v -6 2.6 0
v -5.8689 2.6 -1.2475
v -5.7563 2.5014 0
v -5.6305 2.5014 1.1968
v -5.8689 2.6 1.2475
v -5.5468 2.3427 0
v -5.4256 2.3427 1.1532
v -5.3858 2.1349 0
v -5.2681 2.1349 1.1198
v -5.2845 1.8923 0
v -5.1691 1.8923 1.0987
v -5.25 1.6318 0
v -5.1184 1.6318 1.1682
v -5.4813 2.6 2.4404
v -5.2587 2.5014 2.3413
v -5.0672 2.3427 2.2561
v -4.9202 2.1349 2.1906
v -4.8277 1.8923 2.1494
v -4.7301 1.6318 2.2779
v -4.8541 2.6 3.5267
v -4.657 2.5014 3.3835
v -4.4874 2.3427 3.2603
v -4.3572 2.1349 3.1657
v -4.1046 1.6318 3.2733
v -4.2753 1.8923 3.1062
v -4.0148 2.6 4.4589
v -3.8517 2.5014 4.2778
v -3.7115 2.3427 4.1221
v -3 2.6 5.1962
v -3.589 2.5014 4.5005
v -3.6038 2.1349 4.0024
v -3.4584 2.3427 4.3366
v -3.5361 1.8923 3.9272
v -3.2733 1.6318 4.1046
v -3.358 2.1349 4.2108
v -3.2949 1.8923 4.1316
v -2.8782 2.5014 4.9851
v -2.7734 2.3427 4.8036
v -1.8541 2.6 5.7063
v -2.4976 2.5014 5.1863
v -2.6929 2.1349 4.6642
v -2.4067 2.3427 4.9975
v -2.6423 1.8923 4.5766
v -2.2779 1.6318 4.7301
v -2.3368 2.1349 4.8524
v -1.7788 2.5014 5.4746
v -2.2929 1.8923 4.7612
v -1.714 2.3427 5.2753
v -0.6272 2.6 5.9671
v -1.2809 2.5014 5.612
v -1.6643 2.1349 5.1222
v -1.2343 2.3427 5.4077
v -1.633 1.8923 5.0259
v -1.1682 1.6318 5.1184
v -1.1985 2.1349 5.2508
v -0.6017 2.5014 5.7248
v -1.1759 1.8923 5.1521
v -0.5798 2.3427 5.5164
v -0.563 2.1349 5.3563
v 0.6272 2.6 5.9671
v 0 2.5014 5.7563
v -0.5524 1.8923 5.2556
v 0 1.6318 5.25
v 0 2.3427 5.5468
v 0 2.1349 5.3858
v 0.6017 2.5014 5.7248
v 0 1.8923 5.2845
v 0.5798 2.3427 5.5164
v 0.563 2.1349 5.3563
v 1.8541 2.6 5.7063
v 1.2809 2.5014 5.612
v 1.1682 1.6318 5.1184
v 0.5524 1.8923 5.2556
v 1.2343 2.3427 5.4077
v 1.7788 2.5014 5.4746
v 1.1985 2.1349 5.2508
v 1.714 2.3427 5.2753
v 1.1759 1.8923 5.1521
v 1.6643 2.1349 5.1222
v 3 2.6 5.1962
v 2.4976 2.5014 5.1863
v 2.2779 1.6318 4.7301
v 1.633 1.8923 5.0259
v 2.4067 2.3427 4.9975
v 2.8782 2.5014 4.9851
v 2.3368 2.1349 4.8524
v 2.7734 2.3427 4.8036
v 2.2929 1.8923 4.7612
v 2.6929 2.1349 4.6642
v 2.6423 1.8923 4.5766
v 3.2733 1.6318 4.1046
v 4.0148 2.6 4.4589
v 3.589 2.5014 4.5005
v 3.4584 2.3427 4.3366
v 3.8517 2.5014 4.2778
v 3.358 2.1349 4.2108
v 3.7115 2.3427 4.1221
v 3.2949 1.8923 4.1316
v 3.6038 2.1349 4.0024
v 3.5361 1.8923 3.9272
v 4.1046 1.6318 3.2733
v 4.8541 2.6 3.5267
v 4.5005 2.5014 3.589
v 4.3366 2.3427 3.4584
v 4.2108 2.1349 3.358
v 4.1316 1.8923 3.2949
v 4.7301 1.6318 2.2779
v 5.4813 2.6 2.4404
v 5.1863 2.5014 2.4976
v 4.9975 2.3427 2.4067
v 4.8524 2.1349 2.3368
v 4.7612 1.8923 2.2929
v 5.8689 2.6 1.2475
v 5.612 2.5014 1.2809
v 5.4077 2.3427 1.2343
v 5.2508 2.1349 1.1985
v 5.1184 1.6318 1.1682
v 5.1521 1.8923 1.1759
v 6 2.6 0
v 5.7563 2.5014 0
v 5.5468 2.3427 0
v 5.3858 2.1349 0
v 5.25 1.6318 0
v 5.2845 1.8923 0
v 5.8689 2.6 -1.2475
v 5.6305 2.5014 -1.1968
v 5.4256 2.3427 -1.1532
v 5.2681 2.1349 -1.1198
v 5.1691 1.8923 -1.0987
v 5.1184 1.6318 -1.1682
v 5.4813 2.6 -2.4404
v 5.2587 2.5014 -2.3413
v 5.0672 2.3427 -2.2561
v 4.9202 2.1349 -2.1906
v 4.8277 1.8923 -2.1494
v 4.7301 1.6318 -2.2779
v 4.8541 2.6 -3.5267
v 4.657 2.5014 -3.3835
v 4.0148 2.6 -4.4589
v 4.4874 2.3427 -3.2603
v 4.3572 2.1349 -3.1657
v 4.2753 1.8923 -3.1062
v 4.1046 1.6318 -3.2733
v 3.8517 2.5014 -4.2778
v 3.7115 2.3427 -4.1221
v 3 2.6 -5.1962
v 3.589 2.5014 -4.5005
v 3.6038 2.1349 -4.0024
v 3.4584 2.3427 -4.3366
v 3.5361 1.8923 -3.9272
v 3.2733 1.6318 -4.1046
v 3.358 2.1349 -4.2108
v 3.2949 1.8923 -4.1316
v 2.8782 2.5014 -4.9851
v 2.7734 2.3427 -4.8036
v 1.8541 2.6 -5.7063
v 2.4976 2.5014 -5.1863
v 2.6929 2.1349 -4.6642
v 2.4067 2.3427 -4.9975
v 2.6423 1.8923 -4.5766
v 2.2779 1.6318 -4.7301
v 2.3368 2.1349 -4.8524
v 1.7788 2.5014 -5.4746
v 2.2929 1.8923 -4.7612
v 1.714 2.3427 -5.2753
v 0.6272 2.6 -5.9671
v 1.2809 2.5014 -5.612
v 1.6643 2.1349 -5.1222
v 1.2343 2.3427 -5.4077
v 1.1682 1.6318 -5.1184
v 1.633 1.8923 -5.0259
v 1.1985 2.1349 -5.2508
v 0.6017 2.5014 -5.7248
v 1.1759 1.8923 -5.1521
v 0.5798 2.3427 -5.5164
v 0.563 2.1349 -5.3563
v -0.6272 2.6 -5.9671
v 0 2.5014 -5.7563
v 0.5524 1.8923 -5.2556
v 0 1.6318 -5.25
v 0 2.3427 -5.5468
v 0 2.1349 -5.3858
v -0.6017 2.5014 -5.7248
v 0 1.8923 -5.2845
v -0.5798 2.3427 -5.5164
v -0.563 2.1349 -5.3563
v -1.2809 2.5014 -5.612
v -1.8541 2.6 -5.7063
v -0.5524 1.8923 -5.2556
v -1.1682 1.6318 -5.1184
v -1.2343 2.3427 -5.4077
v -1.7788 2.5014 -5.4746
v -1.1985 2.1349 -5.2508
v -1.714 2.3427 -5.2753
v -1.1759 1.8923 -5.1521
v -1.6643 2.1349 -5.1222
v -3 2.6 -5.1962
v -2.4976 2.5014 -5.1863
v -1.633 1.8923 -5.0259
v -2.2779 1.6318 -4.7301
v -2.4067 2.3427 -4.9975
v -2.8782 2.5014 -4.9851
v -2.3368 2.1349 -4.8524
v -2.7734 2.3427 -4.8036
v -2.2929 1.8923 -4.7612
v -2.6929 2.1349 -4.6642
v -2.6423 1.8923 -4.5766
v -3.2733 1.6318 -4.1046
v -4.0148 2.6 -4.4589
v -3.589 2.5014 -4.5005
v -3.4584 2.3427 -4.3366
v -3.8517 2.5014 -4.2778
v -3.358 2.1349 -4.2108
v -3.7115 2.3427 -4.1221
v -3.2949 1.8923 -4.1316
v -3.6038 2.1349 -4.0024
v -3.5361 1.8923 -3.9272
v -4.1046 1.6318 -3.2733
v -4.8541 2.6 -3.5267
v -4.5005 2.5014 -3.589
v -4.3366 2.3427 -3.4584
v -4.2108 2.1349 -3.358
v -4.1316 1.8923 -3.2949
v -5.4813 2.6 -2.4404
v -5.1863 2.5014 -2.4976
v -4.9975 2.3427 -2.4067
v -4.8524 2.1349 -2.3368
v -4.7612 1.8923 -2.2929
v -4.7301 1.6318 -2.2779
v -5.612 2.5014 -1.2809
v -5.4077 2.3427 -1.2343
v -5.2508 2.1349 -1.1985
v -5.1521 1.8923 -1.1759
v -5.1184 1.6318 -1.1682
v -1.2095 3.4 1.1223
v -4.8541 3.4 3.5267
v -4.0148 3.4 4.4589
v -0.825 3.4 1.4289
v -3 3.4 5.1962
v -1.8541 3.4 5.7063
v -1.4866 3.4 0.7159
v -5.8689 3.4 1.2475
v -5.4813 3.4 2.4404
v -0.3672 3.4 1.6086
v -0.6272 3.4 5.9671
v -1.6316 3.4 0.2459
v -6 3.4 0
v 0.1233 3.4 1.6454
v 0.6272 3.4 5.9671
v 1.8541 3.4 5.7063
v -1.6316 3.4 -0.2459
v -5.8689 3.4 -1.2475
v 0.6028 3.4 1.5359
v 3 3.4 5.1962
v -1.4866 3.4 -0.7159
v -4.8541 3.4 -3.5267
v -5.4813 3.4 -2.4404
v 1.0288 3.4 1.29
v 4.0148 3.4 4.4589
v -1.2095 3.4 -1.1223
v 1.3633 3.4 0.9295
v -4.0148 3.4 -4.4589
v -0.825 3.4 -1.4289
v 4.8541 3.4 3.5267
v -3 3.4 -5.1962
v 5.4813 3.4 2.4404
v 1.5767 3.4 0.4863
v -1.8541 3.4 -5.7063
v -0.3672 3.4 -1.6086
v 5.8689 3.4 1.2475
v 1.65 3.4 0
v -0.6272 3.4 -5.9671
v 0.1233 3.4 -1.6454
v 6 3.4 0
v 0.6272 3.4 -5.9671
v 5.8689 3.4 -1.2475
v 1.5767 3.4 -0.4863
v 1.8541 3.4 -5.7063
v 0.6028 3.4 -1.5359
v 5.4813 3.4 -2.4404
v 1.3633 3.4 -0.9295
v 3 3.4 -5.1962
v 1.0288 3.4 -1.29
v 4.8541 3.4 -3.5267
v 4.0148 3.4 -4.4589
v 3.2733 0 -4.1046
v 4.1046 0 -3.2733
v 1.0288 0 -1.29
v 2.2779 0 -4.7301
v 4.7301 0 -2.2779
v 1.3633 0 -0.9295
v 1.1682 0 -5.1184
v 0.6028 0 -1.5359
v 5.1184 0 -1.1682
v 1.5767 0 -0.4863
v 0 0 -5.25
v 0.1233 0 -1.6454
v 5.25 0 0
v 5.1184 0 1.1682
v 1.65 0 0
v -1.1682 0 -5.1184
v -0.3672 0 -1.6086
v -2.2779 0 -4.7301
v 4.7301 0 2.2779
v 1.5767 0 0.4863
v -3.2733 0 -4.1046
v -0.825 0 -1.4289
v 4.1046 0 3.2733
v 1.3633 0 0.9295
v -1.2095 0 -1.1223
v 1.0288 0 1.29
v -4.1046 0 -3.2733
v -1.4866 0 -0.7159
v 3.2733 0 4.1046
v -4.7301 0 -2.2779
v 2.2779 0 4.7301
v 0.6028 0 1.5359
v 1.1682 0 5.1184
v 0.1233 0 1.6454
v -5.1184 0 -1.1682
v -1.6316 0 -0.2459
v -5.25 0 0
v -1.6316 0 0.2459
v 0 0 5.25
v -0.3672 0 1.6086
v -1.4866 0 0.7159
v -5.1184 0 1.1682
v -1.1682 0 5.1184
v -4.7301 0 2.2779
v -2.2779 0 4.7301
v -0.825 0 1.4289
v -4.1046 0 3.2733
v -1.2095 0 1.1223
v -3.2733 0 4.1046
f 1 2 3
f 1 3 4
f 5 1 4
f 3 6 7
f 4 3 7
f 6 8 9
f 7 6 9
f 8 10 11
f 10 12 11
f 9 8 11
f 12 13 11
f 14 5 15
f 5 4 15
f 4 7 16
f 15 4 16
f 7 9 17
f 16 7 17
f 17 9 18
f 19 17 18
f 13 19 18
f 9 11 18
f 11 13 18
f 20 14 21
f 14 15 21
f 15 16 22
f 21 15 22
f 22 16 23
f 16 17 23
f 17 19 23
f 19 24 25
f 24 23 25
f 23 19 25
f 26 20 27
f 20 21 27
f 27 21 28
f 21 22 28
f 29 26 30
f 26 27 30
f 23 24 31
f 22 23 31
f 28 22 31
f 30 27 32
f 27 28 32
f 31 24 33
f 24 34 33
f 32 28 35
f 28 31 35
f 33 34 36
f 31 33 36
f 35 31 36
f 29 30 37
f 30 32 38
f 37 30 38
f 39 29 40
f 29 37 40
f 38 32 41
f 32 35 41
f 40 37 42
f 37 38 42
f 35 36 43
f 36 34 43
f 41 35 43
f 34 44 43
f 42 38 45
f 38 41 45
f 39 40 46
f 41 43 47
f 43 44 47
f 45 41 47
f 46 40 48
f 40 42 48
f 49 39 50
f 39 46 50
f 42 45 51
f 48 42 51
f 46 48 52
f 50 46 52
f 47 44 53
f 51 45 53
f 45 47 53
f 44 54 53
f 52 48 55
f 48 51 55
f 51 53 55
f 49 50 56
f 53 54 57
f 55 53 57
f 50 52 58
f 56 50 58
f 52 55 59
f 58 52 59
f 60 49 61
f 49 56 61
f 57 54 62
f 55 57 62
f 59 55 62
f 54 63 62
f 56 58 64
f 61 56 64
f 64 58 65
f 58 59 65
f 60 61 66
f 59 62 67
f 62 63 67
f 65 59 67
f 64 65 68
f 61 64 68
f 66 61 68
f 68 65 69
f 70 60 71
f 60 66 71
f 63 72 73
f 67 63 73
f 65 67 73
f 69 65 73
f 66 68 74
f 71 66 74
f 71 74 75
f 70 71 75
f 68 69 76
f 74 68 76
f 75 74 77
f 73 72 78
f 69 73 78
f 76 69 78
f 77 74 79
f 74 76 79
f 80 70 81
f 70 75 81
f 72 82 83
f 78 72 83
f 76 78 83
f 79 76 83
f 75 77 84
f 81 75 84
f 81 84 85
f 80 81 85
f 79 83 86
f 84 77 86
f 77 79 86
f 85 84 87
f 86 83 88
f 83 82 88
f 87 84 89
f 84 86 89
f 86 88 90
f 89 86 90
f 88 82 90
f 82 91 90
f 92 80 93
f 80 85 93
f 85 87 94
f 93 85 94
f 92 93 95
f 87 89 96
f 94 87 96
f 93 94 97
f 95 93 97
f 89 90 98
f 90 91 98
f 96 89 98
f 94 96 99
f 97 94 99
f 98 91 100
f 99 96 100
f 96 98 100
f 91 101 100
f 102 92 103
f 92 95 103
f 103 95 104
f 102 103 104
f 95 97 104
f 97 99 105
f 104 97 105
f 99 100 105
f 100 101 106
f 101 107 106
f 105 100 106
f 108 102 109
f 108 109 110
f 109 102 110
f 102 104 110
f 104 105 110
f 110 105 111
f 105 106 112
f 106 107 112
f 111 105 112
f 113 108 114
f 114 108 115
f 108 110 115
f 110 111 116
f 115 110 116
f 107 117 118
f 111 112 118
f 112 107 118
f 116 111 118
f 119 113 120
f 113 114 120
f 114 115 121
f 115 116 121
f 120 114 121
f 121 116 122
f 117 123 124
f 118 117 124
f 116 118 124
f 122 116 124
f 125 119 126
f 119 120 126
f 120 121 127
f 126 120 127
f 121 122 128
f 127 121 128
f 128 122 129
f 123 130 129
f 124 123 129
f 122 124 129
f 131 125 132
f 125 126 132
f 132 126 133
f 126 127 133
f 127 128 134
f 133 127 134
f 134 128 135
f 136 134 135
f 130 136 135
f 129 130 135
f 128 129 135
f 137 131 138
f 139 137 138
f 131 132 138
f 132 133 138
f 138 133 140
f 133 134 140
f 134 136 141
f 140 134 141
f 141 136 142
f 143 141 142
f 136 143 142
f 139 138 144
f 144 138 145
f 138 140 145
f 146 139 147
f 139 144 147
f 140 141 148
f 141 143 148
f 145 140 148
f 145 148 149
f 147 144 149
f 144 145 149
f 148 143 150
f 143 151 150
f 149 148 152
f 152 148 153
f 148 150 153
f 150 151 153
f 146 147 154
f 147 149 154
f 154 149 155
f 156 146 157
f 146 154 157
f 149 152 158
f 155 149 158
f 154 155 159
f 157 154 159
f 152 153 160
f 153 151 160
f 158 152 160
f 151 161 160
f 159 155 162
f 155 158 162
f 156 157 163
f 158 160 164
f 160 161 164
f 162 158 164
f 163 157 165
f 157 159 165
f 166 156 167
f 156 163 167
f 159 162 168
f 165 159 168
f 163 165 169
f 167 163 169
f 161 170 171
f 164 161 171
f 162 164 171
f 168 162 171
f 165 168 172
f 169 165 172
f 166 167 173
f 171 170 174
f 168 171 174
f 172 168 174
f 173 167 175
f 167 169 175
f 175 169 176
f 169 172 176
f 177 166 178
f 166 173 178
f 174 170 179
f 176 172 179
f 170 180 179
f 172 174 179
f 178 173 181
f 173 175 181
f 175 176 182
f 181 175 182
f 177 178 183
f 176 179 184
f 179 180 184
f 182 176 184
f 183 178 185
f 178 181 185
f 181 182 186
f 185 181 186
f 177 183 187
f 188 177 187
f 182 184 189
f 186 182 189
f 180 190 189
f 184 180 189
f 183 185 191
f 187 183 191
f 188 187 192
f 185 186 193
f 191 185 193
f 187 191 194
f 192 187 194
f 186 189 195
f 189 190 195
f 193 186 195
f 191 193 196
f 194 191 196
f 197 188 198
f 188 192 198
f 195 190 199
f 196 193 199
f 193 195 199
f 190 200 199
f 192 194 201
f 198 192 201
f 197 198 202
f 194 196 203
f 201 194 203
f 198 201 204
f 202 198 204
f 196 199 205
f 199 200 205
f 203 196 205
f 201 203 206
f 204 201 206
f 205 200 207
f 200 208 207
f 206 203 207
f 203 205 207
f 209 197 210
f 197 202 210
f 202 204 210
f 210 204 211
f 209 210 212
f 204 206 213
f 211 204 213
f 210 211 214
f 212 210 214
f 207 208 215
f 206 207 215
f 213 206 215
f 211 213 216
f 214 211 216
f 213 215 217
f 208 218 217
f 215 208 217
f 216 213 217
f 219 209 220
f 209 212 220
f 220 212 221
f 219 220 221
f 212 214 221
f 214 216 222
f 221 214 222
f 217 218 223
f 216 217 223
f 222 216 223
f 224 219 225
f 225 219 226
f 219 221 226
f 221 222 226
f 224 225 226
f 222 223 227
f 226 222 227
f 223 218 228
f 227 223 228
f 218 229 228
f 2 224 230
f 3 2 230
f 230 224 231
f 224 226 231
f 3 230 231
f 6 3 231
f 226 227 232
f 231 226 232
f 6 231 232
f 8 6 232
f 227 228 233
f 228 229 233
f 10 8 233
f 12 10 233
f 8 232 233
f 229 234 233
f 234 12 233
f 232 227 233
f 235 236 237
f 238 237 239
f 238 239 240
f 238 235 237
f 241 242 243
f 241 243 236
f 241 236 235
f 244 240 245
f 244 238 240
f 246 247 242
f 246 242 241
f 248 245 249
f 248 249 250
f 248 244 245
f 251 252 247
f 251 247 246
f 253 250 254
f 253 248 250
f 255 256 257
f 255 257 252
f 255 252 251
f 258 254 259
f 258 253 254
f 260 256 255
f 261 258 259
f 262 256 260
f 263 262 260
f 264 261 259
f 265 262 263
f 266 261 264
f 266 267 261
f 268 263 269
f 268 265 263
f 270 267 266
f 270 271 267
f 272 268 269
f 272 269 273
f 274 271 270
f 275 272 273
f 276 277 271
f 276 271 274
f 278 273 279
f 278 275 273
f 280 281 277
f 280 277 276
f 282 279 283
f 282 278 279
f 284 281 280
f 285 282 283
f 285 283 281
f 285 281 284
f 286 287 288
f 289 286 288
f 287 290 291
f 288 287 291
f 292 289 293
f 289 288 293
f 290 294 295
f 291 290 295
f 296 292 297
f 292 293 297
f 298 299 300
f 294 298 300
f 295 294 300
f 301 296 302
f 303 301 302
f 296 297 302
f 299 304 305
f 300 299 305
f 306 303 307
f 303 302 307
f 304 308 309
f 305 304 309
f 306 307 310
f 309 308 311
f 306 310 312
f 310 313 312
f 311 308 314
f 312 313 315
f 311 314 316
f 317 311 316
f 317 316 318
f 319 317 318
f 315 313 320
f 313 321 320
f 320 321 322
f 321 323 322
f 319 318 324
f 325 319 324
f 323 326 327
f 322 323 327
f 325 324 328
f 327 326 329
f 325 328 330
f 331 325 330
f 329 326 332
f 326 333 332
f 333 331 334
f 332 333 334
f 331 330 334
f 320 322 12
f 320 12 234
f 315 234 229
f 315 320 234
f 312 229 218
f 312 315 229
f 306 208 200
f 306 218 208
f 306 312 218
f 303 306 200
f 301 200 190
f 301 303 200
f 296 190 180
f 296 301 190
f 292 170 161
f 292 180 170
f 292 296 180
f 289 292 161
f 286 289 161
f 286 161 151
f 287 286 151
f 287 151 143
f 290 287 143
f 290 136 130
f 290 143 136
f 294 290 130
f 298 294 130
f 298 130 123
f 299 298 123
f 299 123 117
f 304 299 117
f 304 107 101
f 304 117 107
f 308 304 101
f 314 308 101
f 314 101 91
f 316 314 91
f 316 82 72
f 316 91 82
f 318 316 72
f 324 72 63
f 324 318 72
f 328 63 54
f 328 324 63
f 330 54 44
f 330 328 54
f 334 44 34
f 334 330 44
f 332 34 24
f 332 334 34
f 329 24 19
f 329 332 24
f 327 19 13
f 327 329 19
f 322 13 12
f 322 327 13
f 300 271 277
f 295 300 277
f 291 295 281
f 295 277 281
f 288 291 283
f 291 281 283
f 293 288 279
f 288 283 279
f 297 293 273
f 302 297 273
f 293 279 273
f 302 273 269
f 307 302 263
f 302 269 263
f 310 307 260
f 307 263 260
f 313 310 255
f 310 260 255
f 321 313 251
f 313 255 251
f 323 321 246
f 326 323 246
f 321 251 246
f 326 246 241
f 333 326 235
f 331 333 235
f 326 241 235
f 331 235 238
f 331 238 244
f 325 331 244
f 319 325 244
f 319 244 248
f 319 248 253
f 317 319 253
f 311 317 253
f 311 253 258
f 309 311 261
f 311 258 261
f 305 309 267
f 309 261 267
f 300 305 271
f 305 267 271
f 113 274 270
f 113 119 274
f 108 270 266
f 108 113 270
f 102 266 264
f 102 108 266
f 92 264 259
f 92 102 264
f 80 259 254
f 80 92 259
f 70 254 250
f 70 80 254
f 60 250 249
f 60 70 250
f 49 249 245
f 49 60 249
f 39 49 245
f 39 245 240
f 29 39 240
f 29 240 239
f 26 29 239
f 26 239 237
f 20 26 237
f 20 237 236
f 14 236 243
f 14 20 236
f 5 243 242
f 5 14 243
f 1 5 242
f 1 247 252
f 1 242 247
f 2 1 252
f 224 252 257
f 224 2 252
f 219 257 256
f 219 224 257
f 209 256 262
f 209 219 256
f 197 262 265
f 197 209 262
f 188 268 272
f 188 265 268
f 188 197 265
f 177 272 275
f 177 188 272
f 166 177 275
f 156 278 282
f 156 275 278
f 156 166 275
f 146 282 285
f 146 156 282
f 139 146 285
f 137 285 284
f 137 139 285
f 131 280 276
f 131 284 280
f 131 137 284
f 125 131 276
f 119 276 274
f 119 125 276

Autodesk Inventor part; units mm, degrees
ref_plane "YZ Plane" through (0, 0, 0) normal (1, 0, 0) x (0, 1, 0)
ref_plane "XZ Plane" through (0, 0, 0) normal (0, 1, 0) x (-1, 0, 0)
ref_plane "XY Plane" through (0, 0, 0) normal (0, 0, 1) x (1, 0, 0)
sketch "Boceto1" plane through (0, 0, 0) normal (0, 1, 0) x (-1, 0, 0)
  circle A0 centre (0, 0) radius 5.25
  dimension "d0" = 10.5
extrude "Extrusión1" add sketch "Boceto1" along normal blind 2.6
sketch "Boceto2" plane through (0, 2.6, 0) normal (0, 1, 0) x (1, 0, 0)
  circle A0 centre (0, 0) radius 6
  dimension "d3" = 12
extrude "Extrusión2" add sketch "Boceto2" along normal blind 0.8
sketch "Boceto3" plane through (0, 3.4, 0) normal (0, 1, 0) x (1, 0, 0)
  circle A0 centre (0, 0) radius 1.65
  dimension "d6" = 3.3
extrude "Extrusión3" cut sketch "Boceto3" against normal through all
fillet "Empalme1" radius 1 1 edges at (5.25, 2.6, 0)
properties part number "RubberSupport"
